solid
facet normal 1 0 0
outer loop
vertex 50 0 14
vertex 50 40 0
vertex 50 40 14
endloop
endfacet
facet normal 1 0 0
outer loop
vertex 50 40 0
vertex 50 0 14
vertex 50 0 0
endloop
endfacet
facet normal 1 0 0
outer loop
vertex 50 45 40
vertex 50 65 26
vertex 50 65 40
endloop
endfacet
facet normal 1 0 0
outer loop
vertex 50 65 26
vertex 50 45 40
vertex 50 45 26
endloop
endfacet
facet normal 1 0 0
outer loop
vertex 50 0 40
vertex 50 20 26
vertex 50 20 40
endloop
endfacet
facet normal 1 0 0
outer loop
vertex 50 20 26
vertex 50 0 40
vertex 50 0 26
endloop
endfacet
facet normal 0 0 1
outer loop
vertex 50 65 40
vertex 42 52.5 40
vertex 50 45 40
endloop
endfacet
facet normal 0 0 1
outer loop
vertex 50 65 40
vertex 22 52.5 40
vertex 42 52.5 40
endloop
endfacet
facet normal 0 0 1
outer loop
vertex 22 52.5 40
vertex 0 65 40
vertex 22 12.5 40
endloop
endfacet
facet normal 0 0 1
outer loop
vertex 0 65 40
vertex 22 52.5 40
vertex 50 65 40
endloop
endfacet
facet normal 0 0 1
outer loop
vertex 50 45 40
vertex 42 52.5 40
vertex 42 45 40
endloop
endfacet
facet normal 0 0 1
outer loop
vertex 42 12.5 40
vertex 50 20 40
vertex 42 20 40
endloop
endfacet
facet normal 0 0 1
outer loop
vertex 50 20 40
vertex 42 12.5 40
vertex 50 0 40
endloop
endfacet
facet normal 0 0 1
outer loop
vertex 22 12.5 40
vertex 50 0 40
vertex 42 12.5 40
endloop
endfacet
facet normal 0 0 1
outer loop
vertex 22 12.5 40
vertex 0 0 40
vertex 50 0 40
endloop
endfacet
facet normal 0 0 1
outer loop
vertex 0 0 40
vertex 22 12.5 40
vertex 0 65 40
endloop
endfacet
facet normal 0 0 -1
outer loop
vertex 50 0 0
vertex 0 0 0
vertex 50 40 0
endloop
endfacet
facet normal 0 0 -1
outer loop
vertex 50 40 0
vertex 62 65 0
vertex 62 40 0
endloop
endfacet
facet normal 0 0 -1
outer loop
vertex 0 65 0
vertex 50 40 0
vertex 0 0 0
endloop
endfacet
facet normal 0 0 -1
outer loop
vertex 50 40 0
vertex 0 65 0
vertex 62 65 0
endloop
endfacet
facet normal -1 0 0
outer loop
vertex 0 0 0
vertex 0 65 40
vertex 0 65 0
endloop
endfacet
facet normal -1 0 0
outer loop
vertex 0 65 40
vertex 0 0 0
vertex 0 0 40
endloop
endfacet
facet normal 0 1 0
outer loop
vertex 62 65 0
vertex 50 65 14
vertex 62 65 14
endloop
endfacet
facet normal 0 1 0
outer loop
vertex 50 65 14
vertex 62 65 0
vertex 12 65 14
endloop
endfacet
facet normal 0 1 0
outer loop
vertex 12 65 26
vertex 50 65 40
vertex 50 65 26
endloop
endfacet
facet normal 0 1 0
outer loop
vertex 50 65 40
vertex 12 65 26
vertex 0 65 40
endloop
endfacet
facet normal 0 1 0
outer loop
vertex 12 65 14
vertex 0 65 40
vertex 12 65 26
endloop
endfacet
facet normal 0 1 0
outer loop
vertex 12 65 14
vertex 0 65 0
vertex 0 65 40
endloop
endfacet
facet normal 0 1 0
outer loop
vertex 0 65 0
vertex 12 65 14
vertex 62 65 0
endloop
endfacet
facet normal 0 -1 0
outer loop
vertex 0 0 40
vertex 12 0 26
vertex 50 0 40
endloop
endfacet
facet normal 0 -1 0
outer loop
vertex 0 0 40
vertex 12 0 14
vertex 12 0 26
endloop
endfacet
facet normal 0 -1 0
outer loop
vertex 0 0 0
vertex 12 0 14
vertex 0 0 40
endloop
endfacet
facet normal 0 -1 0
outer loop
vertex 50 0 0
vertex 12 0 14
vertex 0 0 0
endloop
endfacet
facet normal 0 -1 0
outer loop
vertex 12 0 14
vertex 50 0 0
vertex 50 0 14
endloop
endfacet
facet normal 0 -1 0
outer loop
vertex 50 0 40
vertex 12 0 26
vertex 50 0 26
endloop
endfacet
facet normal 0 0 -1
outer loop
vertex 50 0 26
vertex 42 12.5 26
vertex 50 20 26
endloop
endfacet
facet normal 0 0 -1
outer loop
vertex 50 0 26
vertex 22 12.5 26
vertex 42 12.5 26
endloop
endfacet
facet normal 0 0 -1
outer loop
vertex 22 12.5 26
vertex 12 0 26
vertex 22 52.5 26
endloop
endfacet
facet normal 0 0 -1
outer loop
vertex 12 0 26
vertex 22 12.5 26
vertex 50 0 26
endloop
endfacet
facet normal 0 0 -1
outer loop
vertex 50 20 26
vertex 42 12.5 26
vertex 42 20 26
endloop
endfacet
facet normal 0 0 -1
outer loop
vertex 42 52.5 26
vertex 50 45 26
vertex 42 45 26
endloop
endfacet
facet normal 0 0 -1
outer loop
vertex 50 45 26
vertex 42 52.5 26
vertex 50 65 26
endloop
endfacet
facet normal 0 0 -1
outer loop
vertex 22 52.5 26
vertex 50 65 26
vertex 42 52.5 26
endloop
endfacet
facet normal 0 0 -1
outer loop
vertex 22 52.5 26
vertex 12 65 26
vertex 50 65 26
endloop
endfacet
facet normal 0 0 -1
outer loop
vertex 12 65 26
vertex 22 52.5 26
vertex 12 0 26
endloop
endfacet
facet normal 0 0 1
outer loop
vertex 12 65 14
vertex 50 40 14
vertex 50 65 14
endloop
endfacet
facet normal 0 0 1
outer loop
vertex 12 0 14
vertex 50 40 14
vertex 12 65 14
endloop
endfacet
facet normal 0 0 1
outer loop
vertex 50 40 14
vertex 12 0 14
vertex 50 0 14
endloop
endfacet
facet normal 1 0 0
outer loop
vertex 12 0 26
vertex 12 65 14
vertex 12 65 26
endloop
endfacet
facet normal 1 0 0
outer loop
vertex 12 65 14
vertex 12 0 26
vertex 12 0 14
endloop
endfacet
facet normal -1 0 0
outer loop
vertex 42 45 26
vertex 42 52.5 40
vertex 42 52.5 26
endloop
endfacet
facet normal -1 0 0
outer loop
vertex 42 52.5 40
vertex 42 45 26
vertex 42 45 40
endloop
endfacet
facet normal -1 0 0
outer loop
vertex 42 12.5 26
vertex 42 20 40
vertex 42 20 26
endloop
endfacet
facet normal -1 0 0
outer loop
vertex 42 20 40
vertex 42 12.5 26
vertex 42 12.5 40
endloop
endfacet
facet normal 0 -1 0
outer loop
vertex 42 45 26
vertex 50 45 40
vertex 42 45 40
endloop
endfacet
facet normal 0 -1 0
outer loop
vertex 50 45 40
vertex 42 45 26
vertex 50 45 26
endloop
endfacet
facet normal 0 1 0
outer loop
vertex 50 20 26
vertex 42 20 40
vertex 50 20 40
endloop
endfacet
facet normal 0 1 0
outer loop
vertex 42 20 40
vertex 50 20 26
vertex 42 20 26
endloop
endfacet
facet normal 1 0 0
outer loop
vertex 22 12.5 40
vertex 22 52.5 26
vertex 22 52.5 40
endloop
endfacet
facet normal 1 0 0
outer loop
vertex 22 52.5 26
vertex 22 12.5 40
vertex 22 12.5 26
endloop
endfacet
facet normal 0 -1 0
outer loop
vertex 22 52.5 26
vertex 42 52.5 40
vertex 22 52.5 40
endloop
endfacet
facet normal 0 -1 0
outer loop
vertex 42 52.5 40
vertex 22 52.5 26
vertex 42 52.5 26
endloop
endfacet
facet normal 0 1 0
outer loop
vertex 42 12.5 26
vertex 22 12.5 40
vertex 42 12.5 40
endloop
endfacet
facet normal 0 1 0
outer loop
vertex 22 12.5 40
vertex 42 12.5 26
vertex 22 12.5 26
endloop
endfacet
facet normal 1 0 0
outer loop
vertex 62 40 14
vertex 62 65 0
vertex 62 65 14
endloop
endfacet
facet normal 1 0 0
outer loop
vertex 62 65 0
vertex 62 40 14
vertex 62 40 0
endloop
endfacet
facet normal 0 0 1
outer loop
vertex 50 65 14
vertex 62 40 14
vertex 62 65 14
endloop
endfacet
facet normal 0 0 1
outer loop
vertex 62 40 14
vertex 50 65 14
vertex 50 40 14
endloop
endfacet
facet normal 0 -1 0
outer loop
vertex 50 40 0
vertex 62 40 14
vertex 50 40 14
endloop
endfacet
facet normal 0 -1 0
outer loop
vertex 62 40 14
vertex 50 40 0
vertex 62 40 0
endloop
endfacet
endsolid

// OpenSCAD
//
// Tutorial 1
//

union() {
    difference() {
        cube( [50, 65, 40], center = false );

        translate([ 12,  0, 14] )
            cube( [ 38, 65, 12], center = false );
        translate([ 42, 20, 26] )
            cube( [  8, 25, 14], center = false );
        translate([ 22, 12.5, 26] )
            cube( [ 20, 40, 14], center = false );
    }
    
    // cube supplémentaire
    translate( [ 50, 40,  0] )
        cube( [12, 25, 14], center = false );
}


//
